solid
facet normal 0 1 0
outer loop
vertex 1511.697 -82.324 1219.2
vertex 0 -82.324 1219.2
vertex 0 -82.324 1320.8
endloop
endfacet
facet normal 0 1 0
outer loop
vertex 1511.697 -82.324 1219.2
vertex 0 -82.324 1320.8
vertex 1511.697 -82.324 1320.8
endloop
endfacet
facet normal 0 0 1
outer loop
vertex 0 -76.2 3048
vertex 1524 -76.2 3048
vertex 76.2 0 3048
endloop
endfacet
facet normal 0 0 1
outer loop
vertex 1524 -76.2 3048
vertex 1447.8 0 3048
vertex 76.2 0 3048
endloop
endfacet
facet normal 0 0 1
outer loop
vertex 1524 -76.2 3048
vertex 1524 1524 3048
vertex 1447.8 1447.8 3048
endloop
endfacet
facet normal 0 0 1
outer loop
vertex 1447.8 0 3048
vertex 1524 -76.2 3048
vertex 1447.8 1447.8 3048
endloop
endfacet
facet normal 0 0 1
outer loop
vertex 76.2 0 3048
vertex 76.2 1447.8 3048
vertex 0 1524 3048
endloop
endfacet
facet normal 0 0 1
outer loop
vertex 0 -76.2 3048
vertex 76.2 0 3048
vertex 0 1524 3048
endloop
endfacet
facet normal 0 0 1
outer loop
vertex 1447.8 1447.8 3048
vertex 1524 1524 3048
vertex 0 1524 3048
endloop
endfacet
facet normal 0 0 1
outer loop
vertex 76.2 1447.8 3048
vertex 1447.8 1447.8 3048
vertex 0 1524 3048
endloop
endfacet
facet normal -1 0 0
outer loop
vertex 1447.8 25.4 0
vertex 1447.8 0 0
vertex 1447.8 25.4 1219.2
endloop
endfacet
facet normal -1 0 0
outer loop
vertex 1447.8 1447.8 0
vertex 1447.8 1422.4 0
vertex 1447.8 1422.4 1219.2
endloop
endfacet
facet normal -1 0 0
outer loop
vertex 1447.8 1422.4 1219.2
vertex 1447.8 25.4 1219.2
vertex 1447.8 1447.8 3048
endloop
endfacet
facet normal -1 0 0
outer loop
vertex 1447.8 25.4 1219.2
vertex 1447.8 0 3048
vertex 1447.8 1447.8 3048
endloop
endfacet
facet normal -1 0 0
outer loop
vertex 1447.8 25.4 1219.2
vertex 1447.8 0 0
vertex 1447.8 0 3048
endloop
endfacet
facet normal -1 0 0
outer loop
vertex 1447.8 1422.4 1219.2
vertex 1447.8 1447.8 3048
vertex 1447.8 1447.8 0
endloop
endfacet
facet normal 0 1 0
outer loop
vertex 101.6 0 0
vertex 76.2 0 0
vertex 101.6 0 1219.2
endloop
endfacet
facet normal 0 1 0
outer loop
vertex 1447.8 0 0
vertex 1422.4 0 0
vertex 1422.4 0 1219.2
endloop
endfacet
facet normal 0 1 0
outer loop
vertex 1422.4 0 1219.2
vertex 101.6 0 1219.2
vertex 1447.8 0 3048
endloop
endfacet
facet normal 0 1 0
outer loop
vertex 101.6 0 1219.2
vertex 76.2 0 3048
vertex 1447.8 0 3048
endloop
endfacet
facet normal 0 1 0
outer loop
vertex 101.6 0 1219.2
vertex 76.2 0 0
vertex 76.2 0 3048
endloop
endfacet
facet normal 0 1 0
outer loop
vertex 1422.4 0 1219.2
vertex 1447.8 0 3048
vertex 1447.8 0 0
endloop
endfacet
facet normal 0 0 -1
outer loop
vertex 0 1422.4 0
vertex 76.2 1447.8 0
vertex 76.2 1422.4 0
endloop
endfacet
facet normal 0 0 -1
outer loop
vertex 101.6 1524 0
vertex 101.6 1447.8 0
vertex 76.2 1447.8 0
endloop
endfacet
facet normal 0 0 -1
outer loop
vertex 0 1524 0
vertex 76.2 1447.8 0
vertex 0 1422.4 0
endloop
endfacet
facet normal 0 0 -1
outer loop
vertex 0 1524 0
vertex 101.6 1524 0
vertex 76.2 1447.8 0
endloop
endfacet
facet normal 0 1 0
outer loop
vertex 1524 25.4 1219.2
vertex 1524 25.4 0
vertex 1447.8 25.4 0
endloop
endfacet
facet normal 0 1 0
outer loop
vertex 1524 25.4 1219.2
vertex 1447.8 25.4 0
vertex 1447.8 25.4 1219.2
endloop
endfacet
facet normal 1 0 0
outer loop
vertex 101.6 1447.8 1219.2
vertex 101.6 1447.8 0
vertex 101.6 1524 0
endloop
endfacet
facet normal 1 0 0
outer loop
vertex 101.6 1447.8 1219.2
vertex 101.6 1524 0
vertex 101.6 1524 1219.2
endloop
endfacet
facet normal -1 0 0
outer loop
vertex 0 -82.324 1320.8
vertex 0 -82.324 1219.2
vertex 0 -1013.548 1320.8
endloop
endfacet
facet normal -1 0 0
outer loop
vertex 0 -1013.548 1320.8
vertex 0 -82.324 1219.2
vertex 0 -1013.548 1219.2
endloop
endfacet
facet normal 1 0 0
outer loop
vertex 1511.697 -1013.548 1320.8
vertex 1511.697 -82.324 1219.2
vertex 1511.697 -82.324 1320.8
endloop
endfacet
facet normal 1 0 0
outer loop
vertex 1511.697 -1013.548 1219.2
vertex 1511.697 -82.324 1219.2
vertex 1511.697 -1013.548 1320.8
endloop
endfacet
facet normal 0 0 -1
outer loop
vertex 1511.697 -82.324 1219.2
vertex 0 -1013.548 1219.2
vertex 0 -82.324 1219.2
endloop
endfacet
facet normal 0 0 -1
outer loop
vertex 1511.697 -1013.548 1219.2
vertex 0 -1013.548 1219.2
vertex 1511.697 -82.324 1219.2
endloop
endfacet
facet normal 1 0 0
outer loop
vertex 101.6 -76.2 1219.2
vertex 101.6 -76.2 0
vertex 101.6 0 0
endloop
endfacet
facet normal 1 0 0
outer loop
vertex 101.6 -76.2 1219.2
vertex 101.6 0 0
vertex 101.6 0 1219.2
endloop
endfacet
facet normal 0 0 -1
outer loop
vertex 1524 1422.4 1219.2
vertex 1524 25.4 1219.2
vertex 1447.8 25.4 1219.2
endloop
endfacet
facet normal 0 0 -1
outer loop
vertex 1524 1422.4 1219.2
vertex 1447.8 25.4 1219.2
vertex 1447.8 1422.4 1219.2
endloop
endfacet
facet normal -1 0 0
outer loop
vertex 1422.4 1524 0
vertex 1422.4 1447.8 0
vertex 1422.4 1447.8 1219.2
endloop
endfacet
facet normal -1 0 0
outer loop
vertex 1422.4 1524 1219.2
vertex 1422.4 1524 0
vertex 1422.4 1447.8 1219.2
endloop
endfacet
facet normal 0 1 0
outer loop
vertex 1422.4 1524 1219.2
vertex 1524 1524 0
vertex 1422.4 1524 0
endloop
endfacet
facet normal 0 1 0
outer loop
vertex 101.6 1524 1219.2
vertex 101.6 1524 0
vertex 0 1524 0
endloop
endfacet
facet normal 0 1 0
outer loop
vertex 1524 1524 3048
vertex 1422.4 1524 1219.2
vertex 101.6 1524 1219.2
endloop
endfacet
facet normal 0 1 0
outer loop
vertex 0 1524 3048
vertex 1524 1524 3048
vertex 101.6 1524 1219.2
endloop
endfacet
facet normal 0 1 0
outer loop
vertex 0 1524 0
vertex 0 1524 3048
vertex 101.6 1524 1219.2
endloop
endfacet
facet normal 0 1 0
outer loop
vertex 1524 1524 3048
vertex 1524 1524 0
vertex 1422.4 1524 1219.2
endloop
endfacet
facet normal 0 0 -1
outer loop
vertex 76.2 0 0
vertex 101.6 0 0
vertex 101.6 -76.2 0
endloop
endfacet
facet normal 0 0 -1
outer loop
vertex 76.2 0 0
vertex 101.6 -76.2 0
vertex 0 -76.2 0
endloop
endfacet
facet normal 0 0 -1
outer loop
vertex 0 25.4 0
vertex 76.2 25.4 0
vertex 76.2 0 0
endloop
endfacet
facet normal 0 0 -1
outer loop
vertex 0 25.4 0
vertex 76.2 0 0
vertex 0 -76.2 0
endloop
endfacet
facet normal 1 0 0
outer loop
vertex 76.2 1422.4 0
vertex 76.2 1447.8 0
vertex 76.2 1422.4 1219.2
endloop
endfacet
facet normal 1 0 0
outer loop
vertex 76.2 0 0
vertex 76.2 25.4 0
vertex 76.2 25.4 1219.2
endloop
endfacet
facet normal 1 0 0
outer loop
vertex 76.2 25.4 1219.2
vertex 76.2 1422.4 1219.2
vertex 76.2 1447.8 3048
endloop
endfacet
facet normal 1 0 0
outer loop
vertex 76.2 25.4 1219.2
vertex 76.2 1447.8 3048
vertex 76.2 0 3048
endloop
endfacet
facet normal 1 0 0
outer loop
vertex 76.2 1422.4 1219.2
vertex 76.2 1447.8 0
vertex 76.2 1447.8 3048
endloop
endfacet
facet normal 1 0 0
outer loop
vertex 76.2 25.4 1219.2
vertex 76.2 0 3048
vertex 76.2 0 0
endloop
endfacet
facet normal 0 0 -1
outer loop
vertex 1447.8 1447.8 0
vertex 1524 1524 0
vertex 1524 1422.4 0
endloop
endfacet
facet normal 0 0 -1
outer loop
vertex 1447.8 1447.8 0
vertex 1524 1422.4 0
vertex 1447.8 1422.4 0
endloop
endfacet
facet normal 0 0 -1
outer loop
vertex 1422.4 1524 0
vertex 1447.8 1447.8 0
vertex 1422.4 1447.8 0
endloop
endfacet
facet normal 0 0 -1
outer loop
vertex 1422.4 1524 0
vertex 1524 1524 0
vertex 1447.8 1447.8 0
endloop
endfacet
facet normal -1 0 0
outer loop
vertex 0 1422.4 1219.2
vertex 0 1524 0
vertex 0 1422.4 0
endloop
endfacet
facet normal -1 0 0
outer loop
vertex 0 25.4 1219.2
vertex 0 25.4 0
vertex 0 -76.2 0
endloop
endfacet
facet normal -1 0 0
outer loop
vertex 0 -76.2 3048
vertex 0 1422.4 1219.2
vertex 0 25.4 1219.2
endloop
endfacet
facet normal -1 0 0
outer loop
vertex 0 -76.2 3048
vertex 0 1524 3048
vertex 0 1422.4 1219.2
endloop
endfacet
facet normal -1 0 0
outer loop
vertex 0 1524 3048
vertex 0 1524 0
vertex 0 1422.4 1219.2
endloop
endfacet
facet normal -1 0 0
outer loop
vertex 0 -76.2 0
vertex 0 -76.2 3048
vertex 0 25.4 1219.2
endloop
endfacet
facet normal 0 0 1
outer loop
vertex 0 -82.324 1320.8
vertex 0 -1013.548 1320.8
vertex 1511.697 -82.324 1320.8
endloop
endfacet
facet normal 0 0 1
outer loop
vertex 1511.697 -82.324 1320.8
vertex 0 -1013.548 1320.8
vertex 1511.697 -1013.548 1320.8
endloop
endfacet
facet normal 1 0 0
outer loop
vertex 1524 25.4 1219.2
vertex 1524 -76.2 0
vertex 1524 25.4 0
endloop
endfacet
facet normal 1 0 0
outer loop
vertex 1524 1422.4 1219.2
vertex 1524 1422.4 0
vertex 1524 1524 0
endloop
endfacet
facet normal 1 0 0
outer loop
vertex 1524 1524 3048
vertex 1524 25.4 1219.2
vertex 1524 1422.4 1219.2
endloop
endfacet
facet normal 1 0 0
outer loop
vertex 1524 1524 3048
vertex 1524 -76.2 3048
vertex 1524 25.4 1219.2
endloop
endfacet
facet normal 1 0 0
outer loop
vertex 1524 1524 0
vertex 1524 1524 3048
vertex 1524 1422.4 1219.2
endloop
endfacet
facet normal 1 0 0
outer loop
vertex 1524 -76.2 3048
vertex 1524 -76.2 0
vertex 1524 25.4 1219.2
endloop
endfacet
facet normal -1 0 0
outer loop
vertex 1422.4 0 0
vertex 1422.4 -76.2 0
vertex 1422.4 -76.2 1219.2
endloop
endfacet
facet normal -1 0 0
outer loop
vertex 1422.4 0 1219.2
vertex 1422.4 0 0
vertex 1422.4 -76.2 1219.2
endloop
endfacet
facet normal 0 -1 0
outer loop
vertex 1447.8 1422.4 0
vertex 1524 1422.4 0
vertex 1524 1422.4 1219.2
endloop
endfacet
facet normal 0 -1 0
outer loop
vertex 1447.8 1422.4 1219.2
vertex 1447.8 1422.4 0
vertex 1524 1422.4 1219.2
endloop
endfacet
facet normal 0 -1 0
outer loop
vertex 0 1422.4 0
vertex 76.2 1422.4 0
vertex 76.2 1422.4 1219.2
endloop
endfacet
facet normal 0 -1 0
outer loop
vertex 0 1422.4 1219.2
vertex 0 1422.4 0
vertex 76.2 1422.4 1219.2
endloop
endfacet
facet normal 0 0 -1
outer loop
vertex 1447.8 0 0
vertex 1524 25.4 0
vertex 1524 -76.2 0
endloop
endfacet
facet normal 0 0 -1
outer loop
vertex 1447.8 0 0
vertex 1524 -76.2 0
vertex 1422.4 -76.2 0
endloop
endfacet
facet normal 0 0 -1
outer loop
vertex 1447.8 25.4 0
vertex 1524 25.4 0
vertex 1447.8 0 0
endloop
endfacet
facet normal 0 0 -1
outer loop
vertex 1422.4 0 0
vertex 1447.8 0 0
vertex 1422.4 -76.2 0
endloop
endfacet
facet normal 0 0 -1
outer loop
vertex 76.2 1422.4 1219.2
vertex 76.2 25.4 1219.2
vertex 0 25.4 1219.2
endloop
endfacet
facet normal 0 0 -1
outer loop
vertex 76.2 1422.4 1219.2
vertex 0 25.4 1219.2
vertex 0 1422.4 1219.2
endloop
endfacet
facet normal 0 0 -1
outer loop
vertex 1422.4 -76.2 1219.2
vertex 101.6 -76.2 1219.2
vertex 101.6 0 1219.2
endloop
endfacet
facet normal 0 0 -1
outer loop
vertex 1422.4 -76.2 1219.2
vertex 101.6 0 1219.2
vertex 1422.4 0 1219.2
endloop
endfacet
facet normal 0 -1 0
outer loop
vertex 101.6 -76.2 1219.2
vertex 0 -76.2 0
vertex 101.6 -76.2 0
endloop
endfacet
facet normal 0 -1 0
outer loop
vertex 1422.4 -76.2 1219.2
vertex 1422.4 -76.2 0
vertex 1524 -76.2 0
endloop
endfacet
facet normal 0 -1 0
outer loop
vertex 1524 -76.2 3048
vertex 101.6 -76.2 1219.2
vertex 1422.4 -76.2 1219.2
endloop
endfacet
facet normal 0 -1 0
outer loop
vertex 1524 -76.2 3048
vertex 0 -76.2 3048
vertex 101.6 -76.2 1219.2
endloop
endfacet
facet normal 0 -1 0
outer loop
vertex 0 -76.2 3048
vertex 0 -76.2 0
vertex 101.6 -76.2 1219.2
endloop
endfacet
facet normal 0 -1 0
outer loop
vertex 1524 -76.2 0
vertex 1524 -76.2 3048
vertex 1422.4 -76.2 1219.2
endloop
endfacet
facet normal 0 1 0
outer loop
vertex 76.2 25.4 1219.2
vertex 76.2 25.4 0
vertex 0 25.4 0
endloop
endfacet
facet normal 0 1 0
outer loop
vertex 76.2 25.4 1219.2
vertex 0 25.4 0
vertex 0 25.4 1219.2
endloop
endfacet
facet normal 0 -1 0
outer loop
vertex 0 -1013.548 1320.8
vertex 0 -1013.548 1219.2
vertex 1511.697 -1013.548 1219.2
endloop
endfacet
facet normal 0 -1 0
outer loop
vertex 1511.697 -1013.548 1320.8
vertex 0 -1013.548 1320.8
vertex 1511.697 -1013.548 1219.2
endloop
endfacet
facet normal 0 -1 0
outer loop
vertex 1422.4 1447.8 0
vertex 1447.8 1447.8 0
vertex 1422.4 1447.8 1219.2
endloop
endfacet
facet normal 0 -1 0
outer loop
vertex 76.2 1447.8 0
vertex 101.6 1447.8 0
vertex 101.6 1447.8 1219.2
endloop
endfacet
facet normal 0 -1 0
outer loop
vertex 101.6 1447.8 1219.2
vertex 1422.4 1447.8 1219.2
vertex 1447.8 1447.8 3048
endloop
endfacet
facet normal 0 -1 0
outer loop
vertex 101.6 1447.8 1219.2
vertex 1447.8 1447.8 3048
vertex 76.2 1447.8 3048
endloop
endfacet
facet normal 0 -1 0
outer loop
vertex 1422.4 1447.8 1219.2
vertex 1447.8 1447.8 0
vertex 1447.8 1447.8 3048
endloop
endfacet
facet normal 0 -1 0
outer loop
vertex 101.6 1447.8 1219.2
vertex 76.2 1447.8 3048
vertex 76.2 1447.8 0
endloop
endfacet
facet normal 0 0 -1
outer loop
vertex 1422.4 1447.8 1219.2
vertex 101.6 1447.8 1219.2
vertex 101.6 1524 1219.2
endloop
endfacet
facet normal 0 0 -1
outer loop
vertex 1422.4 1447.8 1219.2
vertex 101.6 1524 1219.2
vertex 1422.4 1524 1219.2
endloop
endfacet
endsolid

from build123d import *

# Parameters (mm, degrees)
F0_W      = 1524
F0_H      = 3048
F1_DEPTH  = 76.2
F2_W      = 1524
F2_H      = 3048
F3_DEPTH  = 76.2
F4_W      = 1524
F4_H      = 3048
F5_DEPTH  = 76.2
F6_W      = 1371.6
F6_H      = 3048
F7_DEPTH  = 76.2
F8_W      = 1397
F8_H      = 1219.2
F9_DEPTH  = 1574.8
F10_W     = 1320.8
F10_H     = 1219.2
F11_DEPTH = 1676.4
F12_W     = 1511.697054
F12_H     = 931.223624
F13_DEPTH = 101.6


with BuildPart() as f1:
    # F0 (on Front) → F1 (new body)
    with BuildSketch(Plane.XZ):
        with Locations((762, 1524)):
            Rectangle(F0_W, F0_H)
    extrude(amount=F1_DEPTH)

    # F2 (on face) → F3 (join)
    with BuildSketch(Plane.YZ.offset(1524)):
        with Locations((762, 1524)):
            Rectangle(F2_W, F2_H)
    extrude(amount=-F3_DEPTH)

    # F4 (on face) → F5 (join)
    with BuildSketch(Plane(origin=(0, 0, 0), x_dir=(0, -1, 0), z_dir=(-1, 0, 0))):
        with Locations((-762, 1524)):
            Rectangle(F4_W, F4_H)
    extrude(amount=-F5_DEPTH)

    # F6 (on face) → F7 (join)
    with BuildSketch(Plane(origin=(0, 1524, 0), x_dir=(-1, 0, 0), z_dir=(0, 1, 0))):
        with Locations((-762, 1524)):
            Rectangle(F6_W, F6_H)
    extrude(amount=-F7_DEPTH)

    # F8 (on face) → F9 (cut)
    with BuildSketch(Plane.YZ.offset(1524)):
        with Locations((723.9, 609.6)):
            Rectangle(F8_W, F8_H)
    extrude(amount=-F9_DEPTH, mode=Mode.SUBTRACT)

    # F10 (on face) → F11 (cut)
    with BuildSketch(Plane.XZ.offset(76.2)):
        with Locations((762, 609.6)):
            Rectangle(F10_W, F10_H)
    extrude(amount=-F11_DEPTH, mode=Mode.SUBTRACT)


with BuildPart() as f13:
    # F12 (on face) → F13 (new body)
    with BuildSketch(Plane(origin=(0, 0, 1219.2), x_dir=(1, 0, 0), z_dir=(0, 0, -1))):
        with Locations((755.848527, 547.935847)):
            Rectangle(F12_W, F12_H)
    extrude(amount=-F13_DEPTH)


solid = Compound([f1.part, f13.part])
